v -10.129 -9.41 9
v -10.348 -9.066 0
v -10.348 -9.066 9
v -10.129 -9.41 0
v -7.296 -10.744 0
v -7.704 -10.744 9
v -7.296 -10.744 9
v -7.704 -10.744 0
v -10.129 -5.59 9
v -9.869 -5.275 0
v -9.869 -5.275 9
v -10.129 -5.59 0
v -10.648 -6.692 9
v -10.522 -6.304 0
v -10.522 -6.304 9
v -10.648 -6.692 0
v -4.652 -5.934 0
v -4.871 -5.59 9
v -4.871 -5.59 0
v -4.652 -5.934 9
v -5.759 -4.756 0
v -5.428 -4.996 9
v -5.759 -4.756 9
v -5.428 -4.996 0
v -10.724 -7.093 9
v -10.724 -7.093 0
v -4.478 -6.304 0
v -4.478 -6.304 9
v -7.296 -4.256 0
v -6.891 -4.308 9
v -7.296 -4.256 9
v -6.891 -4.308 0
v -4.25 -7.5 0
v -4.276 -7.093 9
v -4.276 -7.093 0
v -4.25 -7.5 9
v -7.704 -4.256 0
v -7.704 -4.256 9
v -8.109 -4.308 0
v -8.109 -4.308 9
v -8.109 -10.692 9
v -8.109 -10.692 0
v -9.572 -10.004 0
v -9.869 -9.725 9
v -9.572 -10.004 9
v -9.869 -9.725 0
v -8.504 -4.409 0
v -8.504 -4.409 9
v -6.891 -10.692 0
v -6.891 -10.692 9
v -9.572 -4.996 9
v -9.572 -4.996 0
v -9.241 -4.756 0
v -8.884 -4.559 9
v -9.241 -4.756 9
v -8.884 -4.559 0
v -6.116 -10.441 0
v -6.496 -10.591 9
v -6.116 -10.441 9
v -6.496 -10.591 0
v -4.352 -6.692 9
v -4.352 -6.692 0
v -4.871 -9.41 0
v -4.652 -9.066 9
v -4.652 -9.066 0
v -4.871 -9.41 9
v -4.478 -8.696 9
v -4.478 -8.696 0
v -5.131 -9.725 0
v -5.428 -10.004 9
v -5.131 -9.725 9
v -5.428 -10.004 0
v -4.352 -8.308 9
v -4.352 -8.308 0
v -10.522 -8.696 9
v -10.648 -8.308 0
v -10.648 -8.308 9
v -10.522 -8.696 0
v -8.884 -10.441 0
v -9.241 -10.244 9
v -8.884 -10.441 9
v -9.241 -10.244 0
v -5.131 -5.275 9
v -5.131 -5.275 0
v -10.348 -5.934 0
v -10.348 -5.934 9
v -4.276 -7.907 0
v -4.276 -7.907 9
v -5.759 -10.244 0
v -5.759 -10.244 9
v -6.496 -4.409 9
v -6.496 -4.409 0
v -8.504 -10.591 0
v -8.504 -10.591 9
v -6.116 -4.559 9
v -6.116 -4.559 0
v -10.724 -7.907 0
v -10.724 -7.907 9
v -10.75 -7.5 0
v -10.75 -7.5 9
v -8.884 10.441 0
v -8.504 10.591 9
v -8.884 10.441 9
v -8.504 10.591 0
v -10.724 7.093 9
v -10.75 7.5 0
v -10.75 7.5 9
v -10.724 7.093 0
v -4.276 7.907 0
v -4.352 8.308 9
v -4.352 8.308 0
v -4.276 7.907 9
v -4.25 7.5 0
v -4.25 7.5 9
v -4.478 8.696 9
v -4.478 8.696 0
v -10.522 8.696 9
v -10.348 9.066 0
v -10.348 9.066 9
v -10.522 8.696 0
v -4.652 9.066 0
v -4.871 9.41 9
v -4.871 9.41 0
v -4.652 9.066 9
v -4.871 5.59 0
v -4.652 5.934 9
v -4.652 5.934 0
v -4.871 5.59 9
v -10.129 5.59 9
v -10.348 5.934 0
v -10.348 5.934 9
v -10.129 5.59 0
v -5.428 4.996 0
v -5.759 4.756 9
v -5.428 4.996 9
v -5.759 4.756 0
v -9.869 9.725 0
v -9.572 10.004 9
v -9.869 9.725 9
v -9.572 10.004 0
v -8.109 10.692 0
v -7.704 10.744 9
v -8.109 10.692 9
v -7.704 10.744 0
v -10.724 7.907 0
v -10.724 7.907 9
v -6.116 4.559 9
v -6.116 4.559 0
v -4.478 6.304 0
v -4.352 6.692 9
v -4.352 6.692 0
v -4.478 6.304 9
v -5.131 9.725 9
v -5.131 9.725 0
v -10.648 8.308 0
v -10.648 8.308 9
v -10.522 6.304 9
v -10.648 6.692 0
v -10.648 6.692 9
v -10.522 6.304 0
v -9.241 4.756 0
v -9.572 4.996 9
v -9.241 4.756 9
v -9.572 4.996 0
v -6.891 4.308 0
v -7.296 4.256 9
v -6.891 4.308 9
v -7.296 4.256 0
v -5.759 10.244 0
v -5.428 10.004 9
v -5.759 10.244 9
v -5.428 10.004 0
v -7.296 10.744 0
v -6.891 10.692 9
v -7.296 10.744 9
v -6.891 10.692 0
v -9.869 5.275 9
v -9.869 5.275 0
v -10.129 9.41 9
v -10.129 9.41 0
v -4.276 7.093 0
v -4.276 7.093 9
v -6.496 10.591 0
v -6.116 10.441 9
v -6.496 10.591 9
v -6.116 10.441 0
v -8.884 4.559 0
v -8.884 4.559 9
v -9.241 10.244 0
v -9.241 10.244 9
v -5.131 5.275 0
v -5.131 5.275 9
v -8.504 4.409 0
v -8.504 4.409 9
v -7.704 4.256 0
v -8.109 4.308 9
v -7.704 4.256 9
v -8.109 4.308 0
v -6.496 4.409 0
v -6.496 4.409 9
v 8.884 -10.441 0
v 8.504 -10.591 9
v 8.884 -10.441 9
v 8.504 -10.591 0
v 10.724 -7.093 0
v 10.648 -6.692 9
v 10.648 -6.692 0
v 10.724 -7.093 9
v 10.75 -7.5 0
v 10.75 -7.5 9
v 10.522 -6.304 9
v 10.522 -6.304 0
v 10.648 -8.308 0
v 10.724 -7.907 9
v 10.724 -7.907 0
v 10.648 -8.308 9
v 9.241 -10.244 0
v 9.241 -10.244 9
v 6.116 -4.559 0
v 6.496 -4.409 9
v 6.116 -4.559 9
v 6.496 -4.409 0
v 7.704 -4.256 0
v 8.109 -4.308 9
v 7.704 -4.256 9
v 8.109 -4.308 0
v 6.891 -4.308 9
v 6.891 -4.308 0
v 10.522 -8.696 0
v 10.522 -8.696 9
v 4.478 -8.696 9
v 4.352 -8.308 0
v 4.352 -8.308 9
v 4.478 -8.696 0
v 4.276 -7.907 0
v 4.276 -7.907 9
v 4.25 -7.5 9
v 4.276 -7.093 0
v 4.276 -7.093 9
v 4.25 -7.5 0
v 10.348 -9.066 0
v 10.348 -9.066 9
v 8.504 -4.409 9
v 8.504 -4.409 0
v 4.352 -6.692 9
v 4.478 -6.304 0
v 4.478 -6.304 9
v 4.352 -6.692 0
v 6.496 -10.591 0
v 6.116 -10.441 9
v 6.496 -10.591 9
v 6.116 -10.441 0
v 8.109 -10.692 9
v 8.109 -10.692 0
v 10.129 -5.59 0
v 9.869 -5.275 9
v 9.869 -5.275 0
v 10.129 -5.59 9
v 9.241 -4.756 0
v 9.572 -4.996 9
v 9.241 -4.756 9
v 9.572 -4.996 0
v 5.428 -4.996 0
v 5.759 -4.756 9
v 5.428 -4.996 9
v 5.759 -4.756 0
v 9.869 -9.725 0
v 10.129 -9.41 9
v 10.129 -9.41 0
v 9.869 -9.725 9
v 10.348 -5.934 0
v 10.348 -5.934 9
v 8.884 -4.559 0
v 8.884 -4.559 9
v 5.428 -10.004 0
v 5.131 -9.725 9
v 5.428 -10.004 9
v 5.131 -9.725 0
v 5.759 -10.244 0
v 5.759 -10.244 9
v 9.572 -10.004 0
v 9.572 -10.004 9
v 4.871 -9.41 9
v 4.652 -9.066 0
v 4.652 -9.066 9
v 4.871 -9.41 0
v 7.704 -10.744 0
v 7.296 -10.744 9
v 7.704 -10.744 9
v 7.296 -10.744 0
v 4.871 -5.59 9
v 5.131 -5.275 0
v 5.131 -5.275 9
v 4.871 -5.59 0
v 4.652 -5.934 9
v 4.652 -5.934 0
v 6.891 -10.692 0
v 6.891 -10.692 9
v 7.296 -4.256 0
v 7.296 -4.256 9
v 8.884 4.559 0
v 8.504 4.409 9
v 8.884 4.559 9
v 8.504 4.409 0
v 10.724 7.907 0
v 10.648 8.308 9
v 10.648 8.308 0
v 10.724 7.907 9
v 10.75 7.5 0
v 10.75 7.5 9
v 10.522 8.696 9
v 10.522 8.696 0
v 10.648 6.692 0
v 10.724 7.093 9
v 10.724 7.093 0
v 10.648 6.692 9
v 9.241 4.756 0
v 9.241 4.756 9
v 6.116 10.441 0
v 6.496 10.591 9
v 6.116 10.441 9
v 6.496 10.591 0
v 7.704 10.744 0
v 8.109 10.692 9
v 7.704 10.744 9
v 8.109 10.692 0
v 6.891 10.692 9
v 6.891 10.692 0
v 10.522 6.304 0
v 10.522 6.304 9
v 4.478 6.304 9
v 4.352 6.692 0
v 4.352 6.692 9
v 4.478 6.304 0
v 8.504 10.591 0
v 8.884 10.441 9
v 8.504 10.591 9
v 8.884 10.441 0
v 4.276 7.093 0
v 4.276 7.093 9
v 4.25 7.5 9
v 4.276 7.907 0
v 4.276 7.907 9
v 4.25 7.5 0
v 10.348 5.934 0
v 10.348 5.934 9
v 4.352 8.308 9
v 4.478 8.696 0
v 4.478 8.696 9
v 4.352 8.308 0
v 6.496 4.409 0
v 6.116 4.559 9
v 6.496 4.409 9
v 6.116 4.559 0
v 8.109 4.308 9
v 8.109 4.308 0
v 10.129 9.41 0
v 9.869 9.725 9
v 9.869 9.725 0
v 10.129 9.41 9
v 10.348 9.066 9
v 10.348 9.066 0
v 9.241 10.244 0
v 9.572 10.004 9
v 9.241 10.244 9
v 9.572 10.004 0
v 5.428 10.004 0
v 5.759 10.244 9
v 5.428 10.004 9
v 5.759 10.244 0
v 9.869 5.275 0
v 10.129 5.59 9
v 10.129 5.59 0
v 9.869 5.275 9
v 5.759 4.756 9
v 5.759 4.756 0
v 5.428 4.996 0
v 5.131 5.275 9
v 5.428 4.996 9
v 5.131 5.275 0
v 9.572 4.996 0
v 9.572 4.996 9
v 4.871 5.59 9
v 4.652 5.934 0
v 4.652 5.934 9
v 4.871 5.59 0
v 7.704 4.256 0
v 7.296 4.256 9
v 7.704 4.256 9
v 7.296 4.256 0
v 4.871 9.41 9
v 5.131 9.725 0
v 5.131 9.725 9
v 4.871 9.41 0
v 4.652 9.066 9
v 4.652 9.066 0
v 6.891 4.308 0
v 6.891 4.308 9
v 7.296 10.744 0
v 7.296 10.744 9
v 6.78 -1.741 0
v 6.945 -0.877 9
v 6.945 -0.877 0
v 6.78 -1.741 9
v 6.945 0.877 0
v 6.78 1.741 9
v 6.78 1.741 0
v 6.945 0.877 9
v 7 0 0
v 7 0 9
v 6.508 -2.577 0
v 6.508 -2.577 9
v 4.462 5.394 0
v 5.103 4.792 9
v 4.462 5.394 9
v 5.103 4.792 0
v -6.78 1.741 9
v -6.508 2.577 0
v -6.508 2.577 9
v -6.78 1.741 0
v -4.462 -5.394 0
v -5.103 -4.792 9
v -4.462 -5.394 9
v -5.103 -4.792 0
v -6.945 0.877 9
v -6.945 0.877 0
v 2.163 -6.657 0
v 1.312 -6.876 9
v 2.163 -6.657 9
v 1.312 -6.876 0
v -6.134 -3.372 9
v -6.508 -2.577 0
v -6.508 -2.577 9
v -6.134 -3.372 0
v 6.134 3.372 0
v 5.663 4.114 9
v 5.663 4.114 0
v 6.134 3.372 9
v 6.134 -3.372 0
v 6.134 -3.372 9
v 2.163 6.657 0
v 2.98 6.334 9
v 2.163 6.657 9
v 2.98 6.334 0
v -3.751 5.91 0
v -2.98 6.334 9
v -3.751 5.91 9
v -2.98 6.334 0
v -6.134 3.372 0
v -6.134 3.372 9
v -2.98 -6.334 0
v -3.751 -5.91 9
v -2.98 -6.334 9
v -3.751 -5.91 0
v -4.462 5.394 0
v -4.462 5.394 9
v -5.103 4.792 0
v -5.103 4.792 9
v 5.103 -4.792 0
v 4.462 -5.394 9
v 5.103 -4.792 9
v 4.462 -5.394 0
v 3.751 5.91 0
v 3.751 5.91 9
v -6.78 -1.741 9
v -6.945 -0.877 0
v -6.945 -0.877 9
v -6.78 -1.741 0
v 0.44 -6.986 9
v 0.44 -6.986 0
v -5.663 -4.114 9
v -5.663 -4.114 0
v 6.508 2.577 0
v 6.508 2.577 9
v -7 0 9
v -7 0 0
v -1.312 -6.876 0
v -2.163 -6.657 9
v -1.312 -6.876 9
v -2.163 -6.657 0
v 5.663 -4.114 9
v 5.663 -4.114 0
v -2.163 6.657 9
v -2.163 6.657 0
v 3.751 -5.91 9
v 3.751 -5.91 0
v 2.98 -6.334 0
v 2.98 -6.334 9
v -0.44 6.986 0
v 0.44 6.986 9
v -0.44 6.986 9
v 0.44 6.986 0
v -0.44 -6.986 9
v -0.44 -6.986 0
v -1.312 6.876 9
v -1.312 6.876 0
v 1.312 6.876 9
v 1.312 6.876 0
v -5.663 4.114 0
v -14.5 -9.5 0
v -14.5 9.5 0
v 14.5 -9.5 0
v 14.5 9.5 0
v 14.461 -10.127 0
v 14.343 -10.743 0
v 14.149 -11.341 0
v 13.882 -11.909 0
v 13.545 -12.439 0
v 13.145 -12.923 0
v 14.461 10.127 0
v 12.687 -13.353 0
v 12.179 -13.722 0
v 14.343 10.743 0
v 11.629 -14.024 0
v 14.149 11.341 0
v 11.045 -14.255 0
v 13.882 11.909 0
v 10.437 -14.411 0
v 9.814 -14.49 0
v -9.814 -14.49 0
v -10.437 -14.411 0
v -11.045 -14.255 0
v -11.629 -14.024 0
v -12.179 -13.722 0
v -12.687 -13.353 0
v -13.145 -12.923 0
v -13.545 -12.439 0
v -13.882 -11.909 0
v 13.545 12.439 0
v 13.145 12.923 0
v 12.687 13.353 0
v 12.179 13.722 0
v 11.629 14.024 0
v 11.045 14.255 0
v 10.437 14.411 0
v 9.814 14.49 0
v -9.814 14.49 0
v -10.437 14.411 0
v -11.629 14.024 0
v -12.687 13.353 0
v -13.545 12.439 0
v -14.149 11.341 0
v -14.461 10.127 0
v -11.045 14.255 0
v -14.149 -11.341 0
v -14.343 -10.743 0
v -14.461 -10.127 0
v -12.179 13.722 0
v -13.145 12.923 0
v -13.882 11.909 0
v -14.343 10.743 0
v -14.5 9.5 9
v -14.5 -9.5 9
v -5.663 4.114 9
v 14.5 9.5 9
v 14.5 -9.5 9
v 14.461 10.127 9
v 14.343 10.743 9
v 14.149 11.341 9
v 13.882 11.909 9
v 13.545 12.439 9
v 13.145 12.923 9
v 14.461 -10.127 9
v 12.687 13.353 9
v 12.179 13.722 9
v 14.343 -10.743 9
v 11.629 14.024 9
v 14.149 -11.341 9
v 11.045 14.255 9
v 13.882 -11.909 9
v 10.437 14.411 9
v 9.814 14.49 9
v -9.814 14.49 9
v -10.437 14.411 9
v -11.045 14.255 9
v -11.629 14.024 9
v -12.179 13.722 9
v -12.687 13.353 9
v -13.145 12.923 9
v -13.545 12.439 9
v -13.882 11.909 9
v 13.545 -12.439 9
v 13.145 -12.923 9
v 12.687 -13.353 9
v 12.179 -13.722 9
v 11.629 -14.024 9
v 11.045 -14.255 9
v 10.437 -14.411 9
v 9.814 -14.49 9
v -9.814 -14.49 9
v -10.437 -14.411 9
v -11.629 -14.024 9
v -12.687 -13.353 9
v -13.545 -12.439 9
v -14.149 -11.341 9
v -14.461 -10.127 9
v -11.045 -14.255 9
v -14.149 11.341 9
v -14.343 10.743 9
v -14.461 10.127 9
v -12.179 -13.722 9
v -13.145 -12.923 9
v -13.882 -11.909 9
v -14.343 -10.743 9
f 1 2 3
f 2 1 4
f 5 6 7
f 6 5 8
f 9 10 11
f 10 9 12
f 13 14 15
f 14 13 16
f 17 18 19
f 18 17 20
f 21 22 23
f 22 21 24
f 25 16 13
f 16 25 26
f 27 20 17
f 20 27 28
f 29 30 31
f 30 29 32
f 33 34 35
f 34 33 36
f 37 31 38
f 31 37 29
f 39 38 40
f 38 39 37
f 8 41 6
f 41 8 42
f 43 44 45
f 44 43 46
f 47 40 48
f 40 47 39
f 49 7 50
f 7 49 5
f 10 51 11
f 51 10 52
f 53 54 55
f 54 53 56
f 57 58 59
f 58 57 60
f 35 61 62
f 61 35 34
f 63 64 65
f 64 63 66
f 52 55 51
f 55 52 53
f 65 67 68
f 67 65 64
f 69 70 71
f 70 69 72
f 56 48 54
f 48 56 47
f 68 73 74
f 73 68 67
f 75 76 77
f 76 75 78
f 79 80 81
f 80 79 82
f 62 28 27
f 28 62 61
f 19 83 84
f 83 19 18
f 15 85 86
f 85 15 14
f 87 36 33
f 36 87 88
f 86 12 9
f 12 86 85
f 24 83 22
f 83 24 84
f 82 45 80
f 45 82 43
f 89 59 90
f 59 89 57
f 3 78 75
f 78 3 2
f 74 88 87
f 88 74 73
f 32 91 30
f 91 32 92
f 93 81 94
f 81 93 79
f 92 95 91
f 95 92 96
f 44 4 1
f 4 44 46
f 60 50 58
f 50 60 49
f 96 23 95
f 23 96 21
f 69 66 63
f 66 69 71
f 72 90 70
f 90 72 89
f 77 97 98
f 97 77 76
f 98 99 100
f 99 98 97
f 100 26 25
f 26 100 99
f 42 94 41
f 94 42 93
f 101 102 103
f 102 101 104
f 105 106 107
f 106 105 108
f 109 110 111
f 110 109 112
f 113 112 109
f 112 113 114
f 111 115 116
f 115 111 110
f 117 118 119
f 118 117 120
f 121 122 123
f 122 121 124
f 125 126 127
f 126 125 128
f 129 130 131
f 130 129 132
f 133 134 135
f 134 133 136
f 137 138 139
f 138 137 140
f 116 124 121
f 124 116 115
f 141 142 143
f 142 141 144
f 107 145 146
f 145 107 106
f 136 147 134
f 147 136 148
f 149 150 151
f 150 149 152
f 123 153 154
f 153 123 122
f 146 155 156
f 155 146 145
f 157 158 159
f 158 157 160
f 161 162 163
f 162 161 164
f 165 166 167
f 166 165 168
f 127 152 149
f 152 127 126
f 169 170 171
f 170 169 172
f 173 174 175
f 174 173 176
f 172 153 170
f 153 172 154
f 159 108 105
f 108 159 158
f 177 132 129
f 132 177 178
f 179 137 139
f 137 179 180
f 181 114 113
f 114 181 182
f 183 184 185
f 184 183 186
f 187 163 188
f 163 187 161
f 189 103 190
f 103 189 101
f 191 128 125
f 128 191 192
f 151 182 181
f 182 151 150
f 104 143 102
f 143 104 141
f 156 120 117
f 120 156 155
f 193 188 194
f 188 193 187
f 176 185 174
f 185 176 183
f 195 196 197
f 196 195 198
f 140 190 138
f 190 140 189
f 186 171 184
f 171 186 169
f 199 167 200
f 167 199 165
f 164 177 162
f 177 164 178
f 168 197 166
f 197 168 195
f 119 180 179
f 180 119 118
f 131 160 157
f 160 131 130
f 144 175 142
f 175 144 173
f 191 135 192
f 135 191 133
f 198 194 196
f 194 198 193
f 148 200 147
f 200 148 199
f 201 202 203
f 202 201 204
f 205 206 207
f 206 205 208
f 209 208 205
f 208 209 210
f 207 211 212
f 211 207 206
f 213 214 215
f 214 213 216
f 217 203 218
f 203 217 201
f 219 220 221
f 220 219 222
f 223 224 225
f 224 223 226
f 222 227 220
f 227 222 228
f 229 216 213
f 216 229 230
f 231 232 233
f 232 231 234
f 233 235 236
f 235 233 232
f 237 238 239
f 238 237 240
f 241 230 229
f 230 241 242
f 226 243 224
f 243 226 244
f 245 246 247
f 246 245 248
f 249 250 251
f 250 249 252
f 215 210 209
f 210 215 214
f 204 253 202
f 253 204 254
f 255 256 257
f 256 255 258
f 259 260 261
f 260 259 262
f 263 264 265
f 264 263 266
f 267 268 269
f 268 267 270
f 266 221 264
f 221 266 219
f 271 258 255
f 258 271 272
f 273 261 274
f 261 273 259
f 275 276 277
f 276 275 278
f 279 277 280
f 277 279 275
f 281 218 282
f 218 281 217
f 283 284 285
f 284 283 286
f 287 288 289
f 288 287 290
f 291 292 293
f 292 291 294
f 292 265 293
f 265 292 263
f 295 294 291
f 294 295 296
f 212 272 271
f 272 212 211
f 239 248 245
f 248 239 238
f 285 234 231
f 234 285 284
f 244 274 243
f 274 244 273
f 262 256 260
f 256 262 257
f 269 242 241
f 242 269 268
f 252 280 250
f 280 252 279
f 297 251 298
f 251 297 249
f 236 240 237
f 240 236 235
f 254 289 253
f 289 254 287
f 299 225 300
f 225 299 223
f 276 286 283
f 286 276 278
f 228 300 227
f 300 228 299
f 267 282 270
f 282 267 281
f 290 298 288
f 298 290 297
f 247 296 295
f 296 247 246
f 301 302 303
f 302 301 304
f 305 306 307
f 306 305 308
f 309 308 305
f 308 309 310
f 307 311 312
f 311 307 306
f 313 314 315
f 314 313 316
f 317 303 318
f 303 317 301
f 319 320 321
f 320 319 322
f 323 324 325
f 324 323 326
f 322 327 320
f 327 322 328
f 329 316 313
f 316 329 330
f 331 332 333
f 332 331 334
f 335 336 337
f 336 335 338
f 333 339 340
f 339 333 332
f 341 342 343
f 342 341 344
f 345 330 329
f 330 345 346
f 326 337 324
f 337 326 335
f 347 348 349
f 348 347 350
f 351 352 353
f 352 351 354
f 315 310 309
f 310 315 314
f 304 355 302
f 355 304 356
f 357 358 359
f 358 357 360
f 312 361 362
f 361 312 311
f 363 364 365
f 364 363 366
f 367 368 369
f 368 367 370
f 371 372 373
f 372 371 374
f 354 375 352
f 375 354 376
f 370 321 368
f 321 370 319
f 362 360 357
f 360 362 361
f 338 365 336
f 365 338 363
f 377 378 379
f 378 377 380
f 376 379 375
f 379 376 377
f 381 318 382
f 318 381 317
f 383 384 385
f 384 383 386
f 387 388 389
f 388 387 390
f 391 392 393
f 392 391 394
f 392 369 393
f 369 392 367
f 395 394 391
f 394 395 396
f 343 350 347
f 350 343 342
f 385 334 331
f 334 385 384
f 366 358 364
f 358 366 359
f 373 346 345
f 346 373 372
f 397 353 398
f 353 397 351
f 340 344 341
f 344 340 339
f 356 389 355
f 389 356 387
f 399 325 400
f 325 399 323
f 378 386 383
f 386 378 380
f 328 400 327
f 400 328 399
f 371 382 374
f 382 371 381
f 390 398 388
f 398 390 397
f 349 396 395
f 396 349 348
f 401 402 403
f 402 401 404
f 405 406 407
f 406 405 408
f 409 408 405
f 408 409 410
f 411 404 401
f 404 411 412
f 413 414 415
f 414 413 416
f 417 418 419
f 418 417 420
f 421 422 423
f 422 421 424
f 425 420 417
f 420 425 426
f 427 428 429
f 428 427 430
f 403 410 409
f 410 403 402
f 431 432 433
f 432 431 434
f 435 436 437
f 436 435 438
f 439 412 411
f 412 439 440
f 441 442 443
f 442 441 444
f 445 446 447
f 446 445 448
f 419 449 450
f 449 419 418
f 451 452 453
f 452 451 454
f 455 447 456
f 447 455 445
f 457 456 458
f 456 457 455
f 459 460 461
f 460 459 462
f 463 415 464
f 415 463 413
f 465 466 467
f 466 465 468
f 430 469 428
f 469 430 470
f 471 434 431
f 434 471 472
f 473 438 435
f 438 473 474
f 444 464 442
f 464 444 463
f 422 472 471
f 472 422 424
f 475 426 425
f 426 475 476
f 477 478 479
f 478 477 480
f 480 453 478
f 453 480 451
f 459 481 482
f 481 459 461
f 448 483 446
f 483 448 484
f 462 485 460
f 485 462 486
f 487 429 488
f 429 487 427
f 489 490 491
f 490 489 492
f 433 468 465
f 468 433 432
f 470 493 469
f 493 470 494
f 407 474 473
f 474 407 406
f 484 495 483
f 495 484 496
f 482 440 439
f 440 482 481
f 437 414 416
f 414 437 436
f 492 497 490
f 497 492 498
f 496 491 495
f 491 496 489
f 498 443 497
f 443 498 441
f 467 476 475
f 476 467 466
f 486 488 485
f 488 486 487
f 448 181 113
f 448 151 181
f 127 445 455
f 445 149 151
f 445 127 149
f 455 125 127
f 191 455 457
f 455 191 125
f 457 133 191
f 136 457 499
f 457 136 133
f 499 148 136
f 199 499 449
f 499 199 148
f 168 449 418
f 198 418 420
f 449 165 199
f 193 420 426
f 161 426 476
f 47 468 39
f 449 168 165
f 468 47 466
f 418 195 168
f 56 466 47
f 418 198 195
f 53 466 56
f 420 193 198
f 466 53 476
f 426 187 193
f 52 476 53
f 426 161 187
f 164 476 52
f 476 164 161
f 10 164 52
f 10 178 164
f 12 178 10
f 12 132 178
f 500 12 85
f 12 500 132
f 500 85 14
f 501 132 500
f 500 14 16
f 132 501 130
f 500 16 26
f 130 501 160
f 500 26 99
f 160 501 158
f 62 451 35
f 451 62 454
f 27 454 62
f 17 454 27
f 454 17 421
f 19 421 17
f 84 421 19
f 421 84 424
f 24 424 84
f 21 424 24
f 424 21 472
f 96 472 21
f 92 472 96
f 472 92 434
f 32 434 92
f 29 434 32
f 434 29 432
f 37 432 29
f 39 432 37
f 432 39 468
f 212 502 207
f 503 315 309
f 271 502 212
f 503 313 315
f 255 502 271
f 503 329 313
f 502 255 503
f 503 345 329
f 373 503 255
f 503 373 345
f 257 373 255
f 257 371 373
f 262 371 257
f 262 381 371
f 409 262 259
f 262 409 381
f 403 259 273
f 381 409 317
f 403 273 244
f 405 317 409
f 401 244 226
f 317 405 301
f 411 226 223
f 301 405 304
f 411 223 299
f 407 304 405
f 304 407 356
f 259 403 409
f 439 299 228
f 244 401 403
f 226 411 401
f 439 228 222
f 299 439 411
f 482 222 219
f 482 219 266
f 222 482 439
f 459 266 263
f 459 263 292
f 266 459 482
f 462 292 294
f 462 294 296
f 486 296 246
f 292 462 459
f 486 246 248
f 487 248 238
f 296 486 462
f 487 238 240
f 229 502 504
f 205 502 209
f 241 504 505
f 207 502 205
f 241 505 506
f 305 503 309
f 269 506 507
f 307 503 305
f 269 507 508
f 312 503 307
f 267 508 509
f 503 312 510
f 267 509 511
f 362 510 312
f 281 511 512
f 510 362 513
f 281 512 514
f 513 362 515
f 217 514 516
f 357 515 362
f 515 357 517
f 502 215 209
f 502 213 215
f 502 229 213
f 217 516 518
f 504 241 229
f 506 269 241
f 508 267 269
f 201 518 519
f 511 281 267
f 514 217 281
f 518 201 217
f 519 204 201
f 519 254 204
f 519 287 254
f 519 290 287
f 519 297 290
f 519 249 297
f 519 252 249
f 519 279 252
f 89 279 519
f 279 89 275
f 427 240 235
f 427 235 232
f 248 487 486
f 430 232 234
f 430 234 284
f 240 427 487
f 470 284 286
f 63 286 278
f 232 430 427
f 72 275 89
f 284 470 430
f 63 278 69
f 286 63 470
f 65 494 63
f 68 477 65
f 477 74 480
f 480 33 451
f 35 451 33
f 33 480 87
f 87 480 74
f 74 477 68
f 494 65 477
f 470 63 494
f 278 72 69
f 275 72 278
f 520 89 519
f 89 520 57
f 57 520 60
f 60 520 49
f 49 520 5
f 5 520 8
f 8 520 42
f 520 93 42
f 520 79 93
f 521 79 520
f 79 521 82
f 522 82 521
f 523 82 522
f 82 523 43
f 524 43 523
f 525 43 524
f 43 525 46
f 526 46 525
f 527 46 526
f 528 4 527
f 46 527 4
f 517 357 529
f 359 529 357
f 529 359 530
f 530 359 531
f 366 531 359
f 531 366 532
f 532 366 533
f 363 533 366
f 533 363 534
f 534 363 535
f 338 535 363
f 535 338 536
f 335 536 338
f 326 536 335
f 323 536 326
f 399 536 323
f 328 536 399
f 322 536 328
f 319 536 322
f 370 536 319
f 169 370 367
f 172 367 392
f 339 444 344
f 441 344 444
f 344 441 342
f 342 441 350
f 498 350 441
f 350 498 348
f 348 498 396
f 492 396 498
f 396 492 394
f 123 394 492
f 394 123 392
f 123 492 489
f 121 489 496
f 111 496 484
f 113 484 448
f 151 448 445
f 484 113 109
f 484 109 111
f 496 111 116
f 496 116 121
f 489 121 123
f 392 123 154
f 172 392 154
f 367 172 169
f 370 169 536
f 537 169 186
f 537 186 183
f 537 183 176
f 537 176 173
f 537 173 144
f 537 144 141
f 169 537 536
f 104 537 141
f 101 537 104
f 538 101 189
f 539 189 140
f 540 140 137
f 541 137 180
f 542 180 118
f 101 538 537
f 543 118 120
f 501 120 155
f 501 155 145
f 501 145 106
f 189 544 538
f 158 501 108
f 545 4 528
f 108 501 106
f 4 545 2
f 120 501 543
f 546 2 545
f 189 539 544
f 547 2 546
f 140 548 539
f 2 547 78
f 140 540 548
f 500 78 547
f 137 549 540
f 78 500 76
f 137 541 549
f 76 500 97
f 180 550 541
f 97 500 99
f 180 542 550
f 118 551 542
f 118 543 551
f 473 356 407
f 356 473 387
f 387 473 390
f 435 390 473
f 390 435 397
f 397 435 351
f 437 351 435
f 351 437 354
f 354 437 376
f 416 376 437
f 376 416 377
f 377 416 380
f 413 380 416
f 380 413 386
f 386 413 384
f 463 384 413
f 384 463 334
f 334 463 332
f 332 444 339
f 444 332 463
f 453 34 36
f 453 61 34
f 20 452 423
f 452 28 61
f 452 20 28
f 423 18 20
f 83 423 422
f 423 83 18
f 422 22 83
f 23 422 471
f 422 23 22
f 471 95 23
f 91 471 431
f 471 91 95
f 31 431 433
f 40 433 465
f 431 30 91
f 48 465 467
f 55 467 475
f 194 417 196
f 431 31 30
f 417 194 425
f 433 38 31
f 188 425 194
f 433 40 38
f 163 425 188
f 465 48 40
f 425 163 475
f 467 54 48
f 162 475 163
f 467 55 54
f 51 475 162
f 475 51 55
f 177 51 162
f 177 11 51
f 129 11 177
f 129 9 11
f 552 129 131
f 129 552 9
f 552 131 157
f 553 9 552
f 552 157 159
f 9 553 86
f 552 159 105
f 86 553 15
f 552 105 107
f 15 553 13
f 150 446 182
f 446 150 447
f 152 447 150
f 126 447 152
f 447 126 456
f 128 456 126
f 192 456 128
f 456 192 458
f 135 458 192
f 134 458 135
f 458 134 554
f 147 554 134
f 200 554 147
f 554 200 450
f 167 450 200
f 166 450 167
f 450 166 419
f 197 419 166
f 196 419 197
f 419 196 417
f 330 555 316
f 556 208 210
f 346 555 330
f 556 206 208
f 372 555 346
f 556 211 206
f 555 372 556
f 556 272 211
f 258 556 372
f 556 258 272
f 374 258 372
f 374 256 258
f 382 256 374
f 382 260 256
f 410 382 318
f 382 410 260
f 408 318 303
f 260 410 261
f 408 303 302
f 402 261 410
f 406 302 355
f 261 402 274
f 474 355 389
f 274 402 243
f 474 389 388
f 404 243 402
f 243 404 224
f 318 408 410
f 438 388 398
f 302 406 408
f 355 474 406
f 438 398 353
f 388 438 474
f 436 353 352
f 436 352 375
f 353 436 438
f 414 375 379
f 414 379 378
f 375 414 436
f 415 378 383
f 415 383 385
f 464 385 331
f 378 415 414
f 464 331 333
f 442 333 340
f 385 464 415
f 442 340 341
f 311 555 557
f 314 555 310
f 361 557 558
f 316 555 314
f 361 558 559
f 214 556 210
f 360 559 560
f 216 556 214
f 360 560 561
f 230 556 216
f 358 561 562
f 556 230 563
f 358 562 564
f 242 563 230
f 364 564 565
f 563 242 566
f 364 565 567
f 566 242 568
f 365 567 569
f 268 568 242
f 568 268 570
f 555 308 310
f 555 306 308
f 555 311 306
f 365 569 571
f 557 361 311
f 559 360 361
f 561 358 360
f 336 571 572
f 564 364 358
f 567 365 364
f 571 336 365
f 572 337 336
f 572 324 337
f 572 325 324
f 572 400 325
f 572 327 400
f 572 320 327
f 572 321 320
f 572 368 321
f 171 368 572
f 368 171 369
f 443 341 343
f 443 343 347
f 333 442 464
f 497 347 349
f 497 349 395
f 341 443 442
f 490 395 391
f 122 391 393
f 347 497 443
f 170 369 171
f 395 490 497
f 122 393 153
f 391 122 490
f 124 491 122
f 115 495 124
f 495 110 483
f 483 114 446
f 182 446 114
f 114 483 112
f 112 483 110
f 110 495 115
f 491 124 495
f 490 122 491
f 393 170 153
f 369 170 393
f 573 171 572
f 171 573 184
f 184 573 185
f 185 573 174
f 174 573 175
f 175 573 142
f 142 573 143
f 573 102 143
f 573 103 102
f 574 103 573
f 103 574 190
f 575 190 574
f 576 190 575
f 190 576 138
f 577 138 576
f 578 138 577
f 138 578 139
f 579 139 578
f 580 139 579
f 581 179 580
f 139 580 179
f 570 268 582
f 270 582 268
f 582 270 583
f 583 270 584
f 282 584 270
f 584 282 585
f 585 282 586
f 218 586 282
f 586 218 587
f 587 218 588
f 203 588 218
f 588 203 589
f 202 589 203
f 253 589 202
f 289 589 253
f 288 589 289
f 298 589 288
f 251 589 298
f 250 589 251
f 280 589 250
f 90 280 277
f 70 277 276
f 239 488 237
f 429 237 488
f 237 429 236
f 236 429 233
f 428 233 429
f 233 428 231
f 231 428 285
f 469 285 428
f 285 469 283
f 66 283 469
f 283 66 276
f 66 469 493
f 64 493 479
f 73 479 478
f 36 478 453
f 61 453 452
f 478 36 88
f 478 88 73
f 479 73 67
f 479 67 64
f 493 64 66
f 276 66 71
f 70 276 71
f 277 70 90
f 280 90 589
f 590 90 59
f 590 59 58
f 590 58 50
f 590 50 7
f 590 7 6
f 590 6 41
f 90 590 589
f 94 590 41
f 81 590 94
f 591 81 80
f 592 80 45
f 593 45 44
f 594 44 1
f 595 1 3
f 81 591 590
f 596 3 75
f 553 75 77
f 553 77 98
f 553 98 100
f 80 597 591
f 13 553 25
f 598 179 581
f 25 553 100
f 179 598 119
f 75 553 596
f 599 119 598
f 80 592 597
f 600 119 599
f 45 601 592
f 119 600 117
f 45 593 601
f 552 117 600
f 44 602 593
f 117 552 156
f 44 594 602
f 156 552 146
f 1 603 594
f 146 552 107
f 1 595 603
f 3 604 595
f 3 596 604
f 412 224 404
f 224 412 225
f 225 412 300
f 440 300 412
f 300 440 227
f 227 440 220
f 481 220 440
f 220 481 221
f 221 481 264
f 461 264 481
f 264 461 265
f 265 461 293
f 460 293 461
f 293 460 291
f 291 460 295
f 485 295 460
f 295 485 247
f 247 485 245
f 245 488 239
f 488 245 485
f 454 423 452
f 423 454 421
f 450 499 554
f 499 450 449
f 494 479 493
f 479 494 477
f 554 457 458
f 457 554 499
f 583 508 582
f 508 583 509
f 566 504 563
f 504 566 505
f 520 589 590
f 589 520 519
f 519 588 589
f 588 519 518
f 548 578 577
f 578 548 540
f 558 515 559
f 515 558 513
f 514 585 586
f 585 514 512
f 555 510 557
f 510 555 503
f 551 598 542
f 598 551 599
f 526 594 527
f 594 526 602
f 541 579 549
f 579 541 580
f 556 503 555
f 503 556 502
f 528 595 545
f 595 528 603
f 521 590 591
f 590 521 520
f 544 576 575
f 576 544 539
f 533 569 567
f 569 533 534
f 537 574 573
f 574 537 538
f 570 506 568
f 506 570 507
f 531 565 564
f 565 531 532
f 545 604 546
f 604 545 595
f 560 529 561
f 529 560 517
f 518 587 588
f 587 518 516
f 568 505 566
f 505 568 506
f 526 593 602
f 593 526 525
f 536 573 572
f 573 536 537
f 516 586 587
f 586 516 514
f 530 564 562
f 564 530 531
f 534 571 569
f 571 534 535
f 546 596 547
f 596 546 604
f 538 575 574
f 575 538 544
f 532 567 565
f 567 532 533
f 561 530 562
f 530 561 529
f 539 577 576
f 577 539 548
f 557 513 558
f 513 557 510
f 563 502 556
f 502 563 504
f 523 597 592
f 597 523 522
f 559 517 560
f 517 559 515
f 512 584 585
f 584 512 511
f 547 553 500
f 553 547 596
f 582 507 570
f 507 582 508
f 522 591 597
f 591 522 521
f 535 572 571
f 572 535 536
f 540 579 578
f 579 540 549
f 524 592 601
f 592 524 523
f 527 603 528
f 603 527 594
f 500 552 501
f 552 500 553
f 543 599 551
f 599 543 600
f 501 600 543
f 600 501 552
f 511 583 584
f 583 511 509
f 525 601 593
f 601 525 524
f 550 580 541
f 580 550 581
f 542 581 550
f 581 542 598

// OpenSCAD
$fn = 50;


difference() {
	union() {
		hull() {
			translate(v = [-9.5000000000, 9.5000000000, 0]) {
				cylinder(h = 9, r = 5);
			}
			translate(v = [9.5000000000, 9.5000000000, 0]) {
				cylinder(h = 9, r = 5);
			}
			translate(v = [-9.5000000000, -9.5000000000, 0]) {
				cylinder(h = 9, r = 5);
			}
			translate(v = [9.5000000000, -9.5000000000, 0]) {
				cylinder(h = 9, r = 5);
			}
		}
	}
	union() {
		#translate(v = [-7.5000000000, -7.5000000000, -100.0000000000]) {
			cylinder(h = 200, r = 3.2500000000);
		}
		#translate(v = [-7.5000000000, 7.5000000000, -100.0000000000]) {
			cylinder(h = 200, r = 3.2500000000);
		}
		#translate(v = [7.5000000000, -7.5000000000, -100.0000000000]) {
			cylinder(h = 200, r = 3.2500000000);
		}
		#translate(v = [7.5000000000, 7.5000000000, -100.0000000000]) {
			cylinder(h = 200, r = 3.2500000000);
		}
		#cylinder(h = 9, r = 7.0000000000);
	}
}
